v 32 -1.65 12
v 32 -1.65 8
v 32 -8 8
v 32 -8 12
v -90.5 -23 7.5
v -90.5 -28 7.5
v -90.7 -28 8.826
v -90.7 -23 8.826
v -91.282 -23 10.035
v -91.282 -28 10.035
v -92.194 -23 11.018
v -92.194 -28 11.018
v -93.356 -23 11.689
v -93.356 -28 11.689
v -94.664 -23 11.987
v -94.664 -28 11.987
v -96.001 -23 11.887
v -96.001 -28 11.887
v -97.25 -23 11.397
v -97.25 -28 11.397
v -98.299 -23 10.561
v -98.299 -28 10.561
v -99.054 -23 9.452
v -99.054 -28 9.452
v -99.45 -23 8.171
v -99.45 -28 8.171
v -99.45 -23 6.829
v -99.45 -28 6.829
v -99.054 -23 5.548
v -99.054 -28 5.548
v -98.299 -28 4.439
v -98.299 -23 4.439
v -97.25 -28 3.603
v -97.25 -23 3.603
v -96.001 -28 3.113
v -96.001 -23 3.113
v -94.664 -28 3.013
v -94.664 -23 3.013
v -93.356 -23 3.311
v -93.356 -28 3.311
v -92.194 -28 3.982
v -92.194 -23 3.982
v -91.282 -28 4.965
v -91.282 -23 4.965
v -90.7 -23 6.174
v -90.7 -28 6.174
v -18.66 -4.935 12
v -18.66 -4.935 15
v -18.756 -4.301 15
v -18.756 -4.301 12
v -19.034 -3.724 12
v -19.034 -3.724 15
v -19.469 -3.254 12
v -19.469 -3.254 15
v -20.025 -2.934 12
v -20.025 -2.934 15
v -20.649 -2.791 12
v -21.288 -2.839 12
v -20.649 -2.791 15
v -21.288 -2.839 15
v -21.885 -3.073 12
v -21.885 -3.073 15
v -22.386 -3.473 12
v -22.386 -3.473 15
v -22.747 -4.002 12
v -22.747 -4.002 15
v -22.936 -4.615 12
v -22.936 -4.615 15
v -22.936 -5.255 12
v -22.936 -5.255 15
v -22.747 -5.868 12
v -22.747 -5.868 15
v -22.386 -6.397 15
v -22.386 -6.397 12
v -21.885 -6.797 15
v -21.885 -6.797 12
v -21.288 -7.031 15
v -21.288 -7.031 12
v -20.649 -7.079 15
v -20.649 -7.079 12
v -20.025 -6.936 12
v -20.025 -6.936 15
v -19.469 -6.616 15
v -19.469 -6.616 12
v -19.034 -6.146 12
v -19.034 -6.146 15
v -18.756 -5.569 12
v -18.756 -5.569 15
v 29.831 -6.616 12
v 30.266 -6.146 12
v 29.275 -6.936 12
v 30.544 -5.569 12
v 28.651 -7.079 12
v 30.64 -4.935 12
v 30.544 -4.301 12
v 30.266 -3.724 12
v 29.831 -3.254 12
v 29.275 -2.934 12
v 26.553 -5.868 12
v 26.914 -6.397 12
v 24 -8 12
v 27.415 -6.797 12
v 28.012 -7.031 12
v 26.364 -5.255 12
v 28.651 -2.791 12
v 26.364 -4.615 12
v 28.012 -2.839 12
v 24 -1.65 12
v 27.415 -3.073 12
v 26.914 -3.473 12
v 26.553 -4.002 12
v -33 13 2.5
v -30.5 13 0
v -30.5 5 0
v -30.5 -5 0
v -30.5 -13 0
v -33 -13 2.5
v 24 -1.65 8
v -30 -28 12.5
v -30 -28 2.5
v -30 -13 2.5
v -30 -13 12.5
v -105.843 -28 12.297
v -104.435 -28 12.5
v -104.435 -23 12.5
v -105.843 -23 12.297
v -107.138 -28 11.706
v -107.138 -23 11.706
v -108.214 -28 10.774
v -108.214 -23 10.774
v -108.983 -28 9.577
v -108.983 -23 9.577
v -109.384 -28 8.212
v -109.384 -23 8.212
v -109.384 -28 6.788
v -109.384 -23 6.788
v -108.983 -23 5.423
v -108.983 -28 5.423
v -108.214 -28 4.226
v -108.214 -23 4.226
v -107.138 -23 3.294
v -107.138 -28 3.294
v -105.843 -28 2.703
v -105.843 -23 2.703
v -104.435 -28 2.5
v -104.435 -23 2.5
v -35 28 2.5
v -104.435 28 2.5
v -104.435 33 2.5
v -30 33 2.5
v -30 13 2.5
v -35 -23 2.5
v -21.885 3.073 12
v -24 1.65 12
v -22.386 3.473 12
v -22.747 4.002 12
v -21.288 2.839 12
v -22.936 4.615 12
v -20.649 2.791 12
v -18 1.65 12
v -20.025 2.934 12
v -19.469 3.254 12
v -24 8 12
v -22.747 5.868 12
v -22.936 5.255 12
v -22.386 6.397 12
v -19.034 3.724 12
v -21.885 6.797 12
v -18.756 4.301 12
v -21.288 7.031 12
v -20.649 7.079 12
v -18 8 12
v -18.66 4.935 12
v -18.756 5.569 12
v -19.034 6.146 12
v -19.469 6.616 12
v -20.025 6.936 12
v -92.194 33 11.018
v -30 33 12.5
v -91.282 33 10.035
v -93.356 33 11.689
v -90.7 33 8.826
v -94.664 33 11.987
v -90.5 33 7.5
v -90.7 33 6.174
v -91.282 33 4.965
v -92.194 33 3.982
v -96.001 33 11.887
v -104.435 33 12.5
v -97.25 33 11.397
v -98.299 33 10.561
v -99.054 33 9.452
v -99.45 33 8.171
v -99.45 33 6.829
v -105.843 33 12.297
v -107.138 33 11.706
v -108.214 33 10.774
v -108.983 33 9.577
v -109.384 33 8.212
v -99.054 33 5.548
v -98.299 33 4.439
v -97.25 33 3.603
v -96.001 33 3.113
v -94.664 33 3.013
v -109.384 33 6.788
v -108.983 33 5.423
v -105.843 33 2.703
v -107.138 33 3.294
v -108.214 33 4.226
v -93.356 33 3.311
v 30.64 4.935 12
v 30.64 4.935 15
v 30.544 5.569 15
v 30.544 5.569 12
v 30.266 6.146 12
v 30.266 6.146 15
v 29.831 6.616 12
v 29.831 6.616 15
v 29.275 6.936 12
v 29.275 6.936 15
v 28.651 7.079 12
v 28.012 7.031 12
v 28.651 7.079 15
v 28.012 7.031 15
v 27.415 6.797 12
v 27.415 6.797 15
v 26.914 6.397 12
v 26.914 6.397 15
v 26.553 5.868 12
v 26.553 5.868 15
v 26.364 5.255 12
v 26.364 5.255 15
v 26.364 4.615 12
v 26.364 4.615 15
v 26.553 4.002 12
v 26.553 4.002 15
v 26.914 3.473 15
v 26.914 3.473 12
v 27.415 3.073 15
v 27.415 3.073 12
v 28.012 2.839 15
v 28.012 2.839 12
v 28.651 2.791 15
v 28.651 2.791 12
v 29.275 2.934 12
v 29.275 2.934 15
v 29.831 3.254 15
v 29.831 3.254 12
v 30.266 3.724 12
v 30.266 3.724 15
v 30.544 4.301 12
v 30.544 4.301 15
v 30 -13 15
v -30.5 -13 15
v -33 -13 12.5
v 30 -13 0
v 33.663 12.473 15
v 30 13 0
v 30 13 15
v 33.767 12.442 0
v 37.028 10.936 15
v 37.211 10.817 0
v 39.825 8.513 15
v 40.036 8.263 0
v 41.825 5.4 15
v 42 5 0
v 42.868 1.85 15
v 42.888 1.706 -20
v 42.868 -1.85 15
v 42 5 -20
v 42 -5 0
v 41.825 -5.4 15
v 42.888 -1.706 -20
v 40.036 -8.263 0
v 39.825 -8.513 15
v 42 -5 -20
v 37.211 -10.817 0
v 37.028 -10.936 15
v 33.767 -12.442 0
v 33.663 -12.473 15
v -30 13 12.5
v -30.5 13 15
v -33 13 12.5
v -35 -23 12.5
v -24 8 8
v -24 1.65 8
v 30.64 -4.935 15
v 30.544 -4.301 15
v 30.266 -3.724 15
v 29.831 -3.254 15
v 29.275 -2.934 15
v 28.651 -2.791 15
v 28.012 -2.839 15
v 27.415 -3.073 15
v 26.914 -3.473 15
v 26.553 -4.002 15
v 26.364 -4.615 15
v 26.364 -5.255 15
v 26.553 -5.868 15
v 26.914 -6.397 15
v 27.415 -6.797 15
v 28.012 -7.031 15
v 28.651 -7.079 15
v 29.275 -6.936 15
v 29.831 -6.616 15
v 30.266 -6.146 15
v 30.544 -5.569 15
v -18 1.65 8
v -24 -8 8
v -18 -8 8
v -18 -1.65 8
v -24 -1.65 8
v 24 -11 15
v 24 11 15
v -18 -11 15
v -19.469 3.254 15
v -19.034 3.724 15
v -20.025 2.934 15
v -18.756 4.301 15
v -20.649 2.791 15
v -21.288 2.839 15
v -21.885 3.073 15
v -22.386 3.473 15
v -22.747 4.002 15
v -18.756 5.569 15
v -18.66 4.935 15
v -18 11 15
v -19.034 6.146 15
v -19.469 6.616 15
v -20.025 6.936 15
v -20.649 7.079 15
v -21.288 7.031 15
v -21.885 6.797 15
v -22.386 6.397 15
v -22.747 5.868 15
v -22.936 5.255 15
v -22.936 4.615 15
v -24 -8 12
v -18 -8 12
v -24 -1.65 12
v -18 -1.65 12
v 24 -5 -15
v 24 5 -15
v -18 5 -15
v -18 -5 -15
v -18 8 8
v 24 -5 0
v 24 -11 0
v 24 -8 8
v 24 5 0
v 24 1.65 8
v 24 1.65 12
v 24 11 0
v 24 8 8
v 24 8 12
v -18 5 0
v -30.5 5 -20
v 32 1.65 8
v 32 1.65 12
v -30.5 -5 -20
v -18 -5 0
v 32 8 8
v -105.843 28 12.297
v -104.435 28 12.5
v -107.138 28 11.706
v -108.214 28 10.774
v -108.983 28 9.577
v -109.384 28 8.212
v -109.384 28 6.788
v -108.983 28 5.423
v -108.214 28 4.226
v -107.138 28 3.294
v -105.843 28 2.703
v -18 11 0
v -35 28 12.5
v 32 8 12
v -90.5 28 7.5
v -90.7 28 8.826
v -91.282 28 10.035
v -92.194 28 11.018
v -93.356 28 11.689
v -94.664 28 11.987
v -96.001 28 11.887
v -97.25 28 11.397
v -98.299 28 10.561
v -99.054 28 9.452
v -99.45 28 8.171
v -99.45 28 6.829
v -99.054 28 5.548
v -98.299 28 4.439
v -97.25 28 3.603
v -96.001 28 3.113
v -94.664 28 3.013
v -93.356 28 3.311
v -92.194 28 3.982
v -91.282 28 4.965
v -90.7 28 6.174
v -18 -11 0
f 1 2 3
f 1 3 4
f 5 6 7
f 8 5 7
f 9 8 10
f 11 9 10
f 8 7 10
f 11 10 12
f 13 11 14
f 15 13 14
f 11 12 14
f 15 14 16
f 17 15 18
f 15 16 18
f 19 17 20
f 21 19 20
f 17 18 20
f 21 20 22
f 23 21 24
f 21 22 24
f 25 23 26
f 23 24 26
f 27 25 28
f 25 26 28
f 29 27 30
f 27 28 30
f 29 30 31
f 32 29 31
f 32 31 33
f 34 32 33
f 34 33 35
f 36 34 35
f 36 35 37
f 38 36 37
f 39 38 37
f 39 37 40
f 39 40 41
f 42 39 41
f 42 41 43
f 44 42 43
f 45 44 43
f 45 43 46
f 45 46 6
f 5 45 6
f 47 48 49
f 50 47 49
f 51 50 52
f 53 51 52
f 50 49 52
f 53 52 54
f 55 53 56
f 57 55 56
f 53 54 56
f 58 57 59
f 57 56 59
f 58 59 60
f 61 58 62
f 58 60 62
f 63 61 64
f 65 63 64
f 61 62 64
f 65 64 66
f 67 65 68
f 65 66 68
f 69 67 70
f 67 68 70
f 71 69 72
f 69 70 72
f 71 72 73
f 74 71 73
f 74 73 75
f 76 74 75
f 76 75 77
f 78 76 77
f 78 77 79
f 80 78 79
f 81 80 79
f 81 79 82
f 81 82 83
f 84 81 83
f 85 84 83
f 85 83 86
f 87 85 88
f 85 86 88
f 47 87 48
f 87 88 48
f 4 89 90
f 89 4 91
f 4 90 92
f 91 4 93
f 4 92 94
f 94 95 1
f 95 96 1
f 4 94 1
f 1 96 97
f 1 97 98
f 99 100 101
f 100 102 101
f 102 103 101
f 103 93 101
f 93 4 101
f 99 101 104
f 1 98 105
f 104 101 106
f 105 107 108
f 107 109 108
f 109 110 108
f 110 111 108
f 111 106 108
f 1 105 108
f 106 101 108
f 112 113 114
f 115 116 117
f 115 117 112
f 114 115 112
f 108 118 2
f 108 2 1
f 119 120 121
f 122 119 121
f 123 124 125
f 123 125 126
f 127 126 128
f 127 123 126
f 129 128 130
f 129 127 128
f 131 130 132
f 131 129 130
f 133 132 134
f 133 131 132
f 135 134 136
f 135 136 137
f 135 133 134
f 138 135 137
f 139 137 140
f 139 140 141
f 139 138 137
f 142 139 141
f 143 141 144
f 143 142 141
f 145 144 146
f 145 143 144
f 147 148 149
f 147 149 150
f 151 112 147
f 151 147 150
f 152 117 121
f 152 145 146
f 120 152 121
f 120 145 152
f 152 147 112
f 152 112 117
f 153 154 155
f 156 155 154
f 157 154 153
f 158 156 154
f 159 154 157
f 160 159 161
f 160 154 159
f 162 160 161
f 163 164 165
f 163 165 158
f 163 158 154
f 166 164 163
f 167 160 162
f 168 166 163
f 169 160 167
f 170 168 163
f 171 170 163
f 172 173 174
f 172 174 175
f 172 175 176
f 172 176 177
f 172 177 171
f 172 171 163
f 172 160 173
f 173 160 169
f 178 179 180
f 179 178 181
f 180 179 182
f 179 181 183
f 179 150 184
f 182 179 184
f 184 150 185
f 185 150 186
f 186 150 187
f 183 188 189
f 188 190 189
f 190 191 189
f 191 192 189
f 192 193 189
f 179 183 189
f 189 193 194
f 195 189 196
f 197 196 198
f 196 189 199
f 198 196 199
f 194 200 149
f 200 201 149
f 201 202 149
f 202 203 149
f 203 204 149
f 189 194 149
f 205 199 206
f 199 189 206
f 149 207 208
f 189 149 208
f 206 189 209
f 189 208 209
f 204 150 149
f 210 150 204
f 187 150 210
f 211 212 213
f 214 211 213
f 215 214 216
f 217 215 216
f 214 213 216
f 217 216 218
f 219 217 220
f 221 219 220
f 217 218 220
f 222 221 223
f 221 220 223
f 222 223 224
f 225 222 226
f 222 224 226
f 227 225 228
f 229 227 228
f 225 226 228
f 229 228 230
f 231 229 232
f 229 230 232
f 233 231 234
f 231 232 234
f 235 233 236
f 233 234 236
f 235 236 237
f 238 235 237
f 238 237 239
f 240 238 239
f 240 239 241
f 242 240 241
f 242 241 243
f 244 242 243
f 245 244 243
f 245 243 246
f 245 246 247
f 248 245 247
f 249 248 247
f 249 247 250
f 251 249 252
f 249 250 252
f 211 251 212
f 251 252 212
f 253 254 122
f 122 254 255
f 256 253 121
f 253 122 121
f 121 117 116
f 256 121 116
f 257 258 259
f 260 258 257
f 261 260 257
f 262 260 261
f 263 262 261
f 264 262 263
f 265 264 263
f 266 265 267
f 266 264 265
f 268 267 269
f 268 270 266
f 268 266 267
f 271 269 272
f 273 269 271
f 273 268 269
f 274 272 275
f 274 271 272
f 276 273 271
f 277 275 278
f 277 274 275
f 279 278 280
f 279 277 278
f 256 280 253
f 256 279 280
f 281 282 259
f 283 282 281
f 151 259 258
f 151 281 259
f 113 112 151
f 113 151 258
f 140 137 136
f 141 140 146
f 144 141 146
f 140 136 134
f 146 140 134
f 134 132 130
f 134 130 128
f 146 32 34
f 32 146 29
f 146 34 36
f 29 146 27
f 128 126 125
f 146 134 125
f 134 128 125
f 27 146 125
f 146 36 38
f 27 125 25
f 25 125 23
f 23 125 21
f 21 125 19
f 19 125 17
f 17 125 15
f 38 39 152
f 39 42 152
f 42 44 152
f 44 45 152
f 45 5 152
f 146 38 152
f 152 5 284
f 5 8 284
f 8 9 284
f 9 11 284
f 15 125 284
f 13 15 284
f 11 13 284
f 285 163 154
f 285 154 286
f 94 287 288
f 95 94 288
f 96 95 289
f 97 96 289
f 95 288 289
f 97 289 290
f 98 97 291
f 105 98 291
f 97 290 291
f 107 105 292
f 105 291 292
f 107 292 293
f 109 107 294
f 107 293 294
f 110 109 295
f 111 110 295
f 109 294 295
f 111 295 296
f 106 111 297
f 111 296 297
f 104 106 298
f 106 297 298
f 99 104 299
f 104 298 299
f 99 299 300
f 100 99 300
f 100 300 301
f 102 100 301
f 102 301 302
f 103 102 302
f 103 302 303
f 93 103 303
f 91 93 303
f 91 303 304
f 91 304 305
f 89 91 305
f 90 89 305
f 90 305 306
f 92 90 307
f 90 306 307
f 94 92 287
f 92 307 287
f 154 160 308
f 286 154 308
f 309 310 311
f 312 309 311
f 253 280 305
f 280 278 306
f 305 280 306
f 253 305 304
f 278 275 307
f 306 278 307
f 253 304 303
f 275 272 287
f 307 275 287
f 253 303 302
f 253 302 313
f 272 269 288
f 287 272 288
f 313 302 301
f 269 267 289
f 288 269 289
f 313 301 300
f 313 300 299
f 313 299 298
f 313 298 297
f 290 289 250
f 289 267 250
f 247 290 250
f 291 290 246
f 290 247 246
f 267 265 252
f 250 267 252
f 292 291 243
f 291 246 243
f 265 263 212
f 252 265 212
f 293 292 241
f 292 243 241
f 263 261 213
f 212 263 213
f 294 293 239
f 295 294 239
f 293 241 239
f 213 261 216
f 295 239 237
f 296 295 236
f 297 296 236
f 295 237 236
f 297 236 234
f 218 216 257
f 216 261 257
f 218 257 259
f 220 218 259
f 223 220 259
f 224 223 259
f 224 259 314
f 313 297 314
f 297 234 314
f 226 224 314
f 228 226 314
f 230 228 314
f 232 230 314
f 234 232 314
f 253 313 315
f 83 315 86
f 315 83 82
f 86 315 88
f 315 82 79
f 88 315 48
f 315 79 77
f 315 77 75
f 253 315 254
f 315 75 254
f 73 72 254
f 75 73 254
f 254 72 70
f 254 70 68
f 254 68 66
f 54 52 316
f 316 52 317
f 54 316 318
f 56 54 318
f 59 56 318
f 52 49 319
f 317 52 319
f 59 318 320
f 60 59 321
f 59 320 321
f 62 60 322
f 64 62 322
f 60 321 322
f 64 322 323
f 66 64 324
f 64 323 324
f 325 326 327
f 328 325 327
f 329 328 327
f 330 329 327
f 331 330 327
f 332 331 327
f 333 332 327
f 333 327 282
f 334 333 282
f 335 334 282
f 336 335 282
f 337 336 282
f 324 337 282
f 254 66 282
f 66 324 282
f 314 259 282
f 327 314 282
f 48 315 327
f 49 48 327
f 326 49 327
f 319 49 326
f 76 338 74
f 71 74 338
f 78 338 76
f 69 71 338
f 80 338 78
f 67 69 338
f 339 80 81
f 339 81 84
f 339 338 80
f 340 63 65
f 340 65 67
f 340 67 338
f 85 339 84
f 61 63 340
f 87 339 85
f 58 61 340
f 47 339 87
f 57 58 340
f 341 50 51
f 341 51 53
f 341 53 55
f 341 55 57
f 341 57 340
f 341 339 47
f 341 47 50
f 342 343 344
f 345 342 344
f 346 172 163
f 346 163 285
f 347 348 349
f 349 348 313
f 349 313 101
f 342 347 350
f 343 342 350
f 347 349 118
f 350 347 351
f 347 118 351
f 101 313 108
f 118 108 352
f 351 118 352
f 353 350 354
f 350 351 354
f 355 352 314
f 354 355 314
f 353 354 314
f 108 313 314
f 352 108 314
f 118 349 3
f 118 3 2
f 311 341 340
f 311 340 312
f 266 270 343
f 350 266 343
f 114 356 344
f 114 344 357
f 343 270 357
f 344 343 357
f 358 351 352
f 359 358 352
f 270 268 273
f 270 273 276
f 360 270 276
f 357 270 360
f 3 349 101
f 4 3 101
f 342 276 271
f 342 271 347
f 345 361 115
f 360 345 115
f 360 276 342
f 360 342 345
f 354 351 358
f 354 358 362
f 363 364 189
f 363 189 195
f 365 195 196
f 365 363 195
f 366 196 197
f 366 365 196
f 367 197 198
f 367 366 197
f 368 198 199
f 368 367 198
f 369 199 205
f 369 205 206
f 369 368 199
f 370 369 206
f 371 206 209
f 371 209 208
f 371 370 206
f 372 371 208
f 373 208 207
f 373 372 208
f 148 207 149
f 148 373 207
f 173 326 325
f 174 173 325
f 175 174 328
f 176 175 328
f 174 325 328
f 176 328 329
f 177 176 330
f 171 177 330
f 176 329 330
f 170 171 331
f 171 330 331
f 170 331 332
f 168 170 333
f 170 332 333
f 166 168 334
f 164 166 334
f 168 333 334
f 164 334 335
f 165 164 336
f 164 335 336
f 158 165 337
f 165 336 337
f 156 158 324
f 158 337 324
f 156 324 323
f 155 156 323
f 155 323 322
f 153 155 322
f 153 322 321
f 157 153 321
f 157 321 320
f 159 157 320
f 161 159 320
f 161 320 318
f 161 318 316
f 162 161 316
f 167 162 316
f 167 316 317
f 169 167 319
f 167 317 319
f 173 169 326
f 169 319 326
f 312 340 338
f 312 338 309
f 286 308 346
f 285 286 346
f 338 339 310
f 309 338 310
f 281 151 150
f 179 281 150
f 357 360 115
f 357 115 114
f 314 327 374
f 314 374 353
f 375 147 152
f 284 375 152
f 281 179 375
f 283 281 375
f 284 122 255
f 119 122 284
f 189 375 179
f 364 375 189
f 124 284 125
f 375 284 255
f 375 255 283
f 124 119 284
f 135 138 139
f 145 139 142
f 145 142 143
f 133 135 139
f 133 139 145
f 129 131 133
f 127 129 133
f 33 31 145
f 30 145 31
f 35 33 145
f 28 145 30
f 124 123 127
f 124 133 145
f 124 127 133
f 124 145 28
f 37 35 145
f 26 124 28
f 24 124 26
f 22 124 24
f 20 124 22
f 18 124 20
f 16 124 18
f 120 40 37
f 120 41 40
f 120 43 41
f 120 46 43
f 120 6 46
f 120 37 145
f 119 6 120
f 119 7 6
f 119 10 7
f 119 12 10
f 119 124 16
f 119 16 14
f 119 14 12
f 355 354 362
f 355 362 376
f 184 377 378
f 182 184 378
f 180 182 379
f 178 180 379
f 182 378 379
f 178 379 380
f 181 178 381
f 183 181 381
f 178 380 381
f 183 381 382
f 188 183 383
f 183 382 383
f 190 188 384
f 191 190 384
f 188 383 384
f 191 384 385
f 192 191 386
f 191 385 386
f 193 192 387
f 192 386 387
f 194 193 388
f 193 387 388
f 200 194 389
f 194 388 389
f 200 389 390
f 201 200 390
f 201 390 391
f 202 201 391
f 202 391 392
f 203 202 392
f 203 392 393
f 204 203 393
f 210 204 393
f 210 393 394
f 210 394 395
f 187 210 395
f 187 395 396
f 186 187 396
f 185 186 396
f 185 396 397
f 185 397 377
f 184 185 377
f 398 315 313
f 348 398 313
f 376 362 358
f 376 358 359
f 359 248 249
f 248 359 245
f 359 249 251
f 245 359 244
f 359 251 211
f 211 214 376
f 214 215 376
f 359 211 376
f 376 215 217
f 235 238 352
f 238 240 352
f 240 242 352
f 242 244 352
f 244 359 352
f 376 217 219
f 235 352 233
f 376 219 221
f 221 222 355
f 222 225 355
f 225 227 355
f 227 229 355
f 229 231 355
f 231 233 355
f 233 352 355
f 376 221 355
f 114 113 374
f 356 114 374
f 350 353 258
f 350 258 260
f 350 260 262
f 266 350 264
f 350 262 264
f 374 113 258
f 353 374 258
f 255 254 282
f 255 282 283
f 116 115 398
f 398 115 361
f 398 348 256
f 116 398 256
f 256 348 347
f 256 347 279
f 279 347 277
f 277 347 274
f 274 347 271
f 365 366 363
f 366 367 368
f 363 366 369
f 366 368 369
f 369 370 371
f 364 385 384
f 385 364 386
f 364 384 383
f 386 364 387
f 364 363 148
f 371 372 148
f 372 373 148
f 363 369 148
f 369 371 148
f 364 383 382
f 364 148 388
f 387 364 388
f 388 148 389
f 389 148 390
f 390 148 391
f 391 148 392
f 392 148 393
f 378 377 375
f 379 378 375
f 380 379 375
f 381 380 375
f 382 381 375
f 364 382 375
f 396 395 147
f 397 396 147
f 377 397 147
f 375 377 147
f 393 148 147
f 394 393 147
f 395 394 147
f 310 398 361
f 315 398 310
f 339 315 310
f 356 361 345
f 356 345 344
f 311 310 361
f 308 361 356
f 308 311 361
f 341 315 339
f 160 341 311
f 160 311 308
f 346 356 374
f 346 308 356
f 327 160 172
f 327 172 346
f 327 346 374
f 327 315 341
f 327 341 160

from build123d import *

# Parameters (mm, degrees)
BOSS_EXTRU_1_DEPTH      = 15
ESQUISSE2_W             = 42
ESQUISSE2_H             = 22
ENL_V_MAT_EXTRU_1_DEPTH = 48.360320945
ESQUISSE4_R             = 2.15
ENL_V_MAT_EXTRU_2_DEPTH = 3
ESQUISSE5_W             = 4
ESQUISSE5_H             = 6.35
ENL_V_MAT_EXTRU_3_DEPTH = 6
ESQUISSE6_W             = 4
ESQUISSE6_H             = 6.35
ENL_V_MAT_EXTRU_4_DEPTH = 8
BOSS_EXTRU_2_DEPTH      = 5
BOSS_EXTRU_2_DEPTH_BACK = 5
CHANFREIN1_SIZE         = 3
BOSS_EXTRU_4_DEPTH      = 5
BOSS_EXTRU_6_START      = 20
ESQUISSE13_W            = 12.5
ESQUISSE13_H            = 10
BOSS_EXTRU_6_DEPTH      = 20
ESQUISSE14_W            = 42
ESQUISSE14_H            = 10
BOSS_EXTRU_7_DEPTH      = 5
BOSS_EXTRU_8_START      = -5
BOSS_EXTRU_8_DEPTH      = 5
ESQUISSE17_R            = 4.5
ENL_V_MAT_EXTRU_5_DEPTH = 127.873828497


with BuildPart() as part:
    # Esquisse1 → Boss.-Extru.1 (new body)
    with BuildSketch(Plane.XY):
        with BuildLine():
            Line((30, -13), (-30, -13))
            Line((-30, -13), (-30, 13))
            Line((-30, 13), (30, 13))
            ThreePointArc((30, 13), (43, 0), (30, -13))
        make_face()
    extrude(amount=BOSS_EXTRU_1_DEPTH)

    # Esquisse2 → Enlèv. mat.-Extru.1 (cut, through all)
    with BuildSketch(Plane.XY.offset(15)):
        with Locations((3, 0)):
            Rectangle(ESQUISSE2_W, ESQUISSE2_H)
    extrude(amount=-ENL_V_MAT_EXTRU_1_DEPTH, mode=Mode.SUBTRACT)

    # Esquisse4 → Enlèv. mat.-Extru.2 (cut)
    with BuildSketch(Plane.XY.offset(15)):
        with Locations((-20.81, 4.935)):
            Circle(ESQUISSE4_R)
        with Locations((-20.81, -4.935)):
            Circle(ESQUISSE4_R)
        with Locations((28.49, 4.935)):
            Circle(ESQUISSE4_R)
        with Locations((28.49, -4.935)):
            Circle(ESQUISSE4_R)
    extrude(amount=-ENL_V_MAT_EXTRU_2_DEPTH, mode=Mode.SUBTRACT)

    # Esquisse5 → Enlèv. mat.-Extru.3 (cut)
    with BuildSketch(Plane(origin=(-18, 0, 0), x_dir=(0, 0, -1), z_dir=(1, 0, 0))):
        with Locations((-10, -4.825)):
            Rectangle(ESQUISSE5_W, ESQUISSE5_H)
        with Locations((-10, 4.825)):
            Rectangle(ESQUISSE5_W, ESQUISSE5_H)
    extrude(amount=-ENL_V_MAT_EXTRU_3_DEPTH, mode=Mode.SUBTRACT)

    # Esquisse6 → Enlèv. mat.-Extru.4 (cut)
    with BuildSketch(Plane.ZY.offset(-24)):
        with Locations((10, 4.825)):
            Rectangle(ESQUISSE6_W, ESQUISSE6_H)
        with Locations((10, -4.825)):
            Rectangle(ESQUISSE6_W, ESQUISSE6_H)
    extrude(amount=-ENL_V_MAT_EXTRU_4_DEPTH, mode=Mode.SUBTRACT)

    # Esquisse9 → Boss.-Extru.2 (add, two sides: drawn at the far end of the back side and taken through both)
    with BuildSketch(Plane.XY.offset(7.5).offset(-BOSS_EXTRU_2_DEPTH_BACK)):
        Polygon((-30, 33), (-95, 33), (-95, 28), (-35, 28), (-35, 0), (-35, -23), (-95, -23), (-95, -28), (-30, -28), (-30, 0), align=None)
    extrude(amount=BOSS_EXTRU_2_DEPTH + BOSS_EXTRU_2_DEPTH_BACK)

    # Chanfrein1
    # the kernel refuses this chamfer: 3 mm, written as the material it adds along each edge
    with BuildSketch(Plane(origin=(-30, 13, 12.5), x_dir=(0.02749587661058678, 0, 0.9996219169112968), z_dir=(0, -1, 0))) as chanfrein1_piece_1_section:
        Polygon((CHANFREIN1_SIZE * 0.999621916911, CHANFREIN1_SIZE * 0.0274958766106), (-CHANFREIN1_SIZE * 0.0274958766106, CHANFREIN1_SIZE * 0.999621916911), (0, 0), align=None)
    chanfrein1_piece_1 = extrude(amount=26, mode=Mode.PRIVATE)
    chanfrein1_piece_1 = split(chanfrein1_piece_1, bisect_by=Plane(origin=(-31.023809524, 0, 15), z_dir=(0, 0, -1)), keep=Keep.TOP, mode=Mode.PRIVATE)
    add(chanfrein1_piece_1)
    with BuildSketch(Plane(origin=(-30, -13, 2.5), x_dir=(0.027495876610585626, 0, -0.9996219169112968), z_dir=(0, 1, 0))) as chanfrein1_piece_2_section:
        Polygon((CHANFREIN1_SIZE * 0.999621916911, CHANFREIN1_SIZE * 0.0274958766106), (-CHANFREIN1_SIZE * 0.0274958766106, CHANFREIN1_SIZE * 0.999621916911), (0, 0), align=None)
    chanfrein1_piece_2 = extrude(amount=26, mode=Mode.PRIVATE)
    chanfrein1_piece_2 = split(chanfrein1_piece_2, bisect_by=Plane(origin=(-31.023809524, 0, 0), z_dir=(0, 0, 1)), keep=Keep.TOP, mode=Mode.PRIVATE)
    add(chanfrein1_piece_2)

    # Esquisse11 → Boss.-Extru.4 (add)
    with BuildSketch(Plane.XZ.offset(28)):
        with BuildLine():
            Line((-95, 2.5), (-95, 12.5))
            Line((-95, 12.5), (-104.43476759, 12.5))
            ThreePointArc((-104.43476759, 12.5), (-109.43476759, 7.5), (-104.43476759, 2.5))
            Line((-104.43476759, 2.5), (-95, 2.5))
        make_face()
    extrude(amount=-BOSS_EXTRU_4_DEPTH)

    # Esquisse13 → Boss.-Extru.6 (add)
    with BuildSketch(Plane(origin=(0, 0, 0), x_dir=(-1, 0, 0), z_dir=(0, 0, -1)).offset(BOSS_EXTRU_6_START)):
        with BuildLine():
            Line((-24, -5), (-24, 5))
            Line((-24, 5), (-42, 5))
            ThreePointArc((-42, 5), (-43, 0), (-42, -5))
            Line((-42, -5), (-24, -5))
        make_face()
        with Locations((24.25, 0)):
            Rectangle(ESQUISSE13_W, ESQUISSE13_H)
    extrude(amount=-BOSS_EXTRU_6_DEPTH)

    # Esquisse14 → Boss.-Extru.7 (add)
    with BuildSketch(Plane(origin=(0, 0, -20), x_dir=(-1, 0, 0), z_dir=(0, 0, -1))):
        with Locations((-3, 0)):
            Rectangle(ESQUISSE14_W, ESQUISSE14_H)
    extrude(amount=-BOSS_EXTRU_7_DEPTH)

    # Esquisse16 → Boss.-Extru.8 (add)
    with BuildSketch(Plane(origin=(0, 33, 0), x_dir=(1, 0, 0), z_dir=(0, 1, 0)).offset(BOSS_EXTRU_8_START)):
        with BuildLine():
            Line((-89.416041875, -12.5), (-104.43476759, -12.5))
            ThreePointArc((-104.43476759, -12.5), (-109.43476759, -7.5), (-104.43476759, -2.5))
            Line((-104.43476759, -2.5), (-89.416041875, -2.5))
            Line((-89.416041875, -2.5), (-89.416041875, -12.5))
        make_face()
    extrude(amount=BOSS_EXTRU_8_DEPTH)

    # Esquisse17 → Enlèv. mat.-Extru.5 (cut, through all)
    with BuildSketch(Plane.XZ.offset(28)):
        with Locations((-95, 7.5)):
            Circle(ESQUISSE17_R)
    extrude(amount=-ENL_V_MAT_EXTRU_5_DEPTH, mode=Mode.SUBTRACT)


solid = part.part
